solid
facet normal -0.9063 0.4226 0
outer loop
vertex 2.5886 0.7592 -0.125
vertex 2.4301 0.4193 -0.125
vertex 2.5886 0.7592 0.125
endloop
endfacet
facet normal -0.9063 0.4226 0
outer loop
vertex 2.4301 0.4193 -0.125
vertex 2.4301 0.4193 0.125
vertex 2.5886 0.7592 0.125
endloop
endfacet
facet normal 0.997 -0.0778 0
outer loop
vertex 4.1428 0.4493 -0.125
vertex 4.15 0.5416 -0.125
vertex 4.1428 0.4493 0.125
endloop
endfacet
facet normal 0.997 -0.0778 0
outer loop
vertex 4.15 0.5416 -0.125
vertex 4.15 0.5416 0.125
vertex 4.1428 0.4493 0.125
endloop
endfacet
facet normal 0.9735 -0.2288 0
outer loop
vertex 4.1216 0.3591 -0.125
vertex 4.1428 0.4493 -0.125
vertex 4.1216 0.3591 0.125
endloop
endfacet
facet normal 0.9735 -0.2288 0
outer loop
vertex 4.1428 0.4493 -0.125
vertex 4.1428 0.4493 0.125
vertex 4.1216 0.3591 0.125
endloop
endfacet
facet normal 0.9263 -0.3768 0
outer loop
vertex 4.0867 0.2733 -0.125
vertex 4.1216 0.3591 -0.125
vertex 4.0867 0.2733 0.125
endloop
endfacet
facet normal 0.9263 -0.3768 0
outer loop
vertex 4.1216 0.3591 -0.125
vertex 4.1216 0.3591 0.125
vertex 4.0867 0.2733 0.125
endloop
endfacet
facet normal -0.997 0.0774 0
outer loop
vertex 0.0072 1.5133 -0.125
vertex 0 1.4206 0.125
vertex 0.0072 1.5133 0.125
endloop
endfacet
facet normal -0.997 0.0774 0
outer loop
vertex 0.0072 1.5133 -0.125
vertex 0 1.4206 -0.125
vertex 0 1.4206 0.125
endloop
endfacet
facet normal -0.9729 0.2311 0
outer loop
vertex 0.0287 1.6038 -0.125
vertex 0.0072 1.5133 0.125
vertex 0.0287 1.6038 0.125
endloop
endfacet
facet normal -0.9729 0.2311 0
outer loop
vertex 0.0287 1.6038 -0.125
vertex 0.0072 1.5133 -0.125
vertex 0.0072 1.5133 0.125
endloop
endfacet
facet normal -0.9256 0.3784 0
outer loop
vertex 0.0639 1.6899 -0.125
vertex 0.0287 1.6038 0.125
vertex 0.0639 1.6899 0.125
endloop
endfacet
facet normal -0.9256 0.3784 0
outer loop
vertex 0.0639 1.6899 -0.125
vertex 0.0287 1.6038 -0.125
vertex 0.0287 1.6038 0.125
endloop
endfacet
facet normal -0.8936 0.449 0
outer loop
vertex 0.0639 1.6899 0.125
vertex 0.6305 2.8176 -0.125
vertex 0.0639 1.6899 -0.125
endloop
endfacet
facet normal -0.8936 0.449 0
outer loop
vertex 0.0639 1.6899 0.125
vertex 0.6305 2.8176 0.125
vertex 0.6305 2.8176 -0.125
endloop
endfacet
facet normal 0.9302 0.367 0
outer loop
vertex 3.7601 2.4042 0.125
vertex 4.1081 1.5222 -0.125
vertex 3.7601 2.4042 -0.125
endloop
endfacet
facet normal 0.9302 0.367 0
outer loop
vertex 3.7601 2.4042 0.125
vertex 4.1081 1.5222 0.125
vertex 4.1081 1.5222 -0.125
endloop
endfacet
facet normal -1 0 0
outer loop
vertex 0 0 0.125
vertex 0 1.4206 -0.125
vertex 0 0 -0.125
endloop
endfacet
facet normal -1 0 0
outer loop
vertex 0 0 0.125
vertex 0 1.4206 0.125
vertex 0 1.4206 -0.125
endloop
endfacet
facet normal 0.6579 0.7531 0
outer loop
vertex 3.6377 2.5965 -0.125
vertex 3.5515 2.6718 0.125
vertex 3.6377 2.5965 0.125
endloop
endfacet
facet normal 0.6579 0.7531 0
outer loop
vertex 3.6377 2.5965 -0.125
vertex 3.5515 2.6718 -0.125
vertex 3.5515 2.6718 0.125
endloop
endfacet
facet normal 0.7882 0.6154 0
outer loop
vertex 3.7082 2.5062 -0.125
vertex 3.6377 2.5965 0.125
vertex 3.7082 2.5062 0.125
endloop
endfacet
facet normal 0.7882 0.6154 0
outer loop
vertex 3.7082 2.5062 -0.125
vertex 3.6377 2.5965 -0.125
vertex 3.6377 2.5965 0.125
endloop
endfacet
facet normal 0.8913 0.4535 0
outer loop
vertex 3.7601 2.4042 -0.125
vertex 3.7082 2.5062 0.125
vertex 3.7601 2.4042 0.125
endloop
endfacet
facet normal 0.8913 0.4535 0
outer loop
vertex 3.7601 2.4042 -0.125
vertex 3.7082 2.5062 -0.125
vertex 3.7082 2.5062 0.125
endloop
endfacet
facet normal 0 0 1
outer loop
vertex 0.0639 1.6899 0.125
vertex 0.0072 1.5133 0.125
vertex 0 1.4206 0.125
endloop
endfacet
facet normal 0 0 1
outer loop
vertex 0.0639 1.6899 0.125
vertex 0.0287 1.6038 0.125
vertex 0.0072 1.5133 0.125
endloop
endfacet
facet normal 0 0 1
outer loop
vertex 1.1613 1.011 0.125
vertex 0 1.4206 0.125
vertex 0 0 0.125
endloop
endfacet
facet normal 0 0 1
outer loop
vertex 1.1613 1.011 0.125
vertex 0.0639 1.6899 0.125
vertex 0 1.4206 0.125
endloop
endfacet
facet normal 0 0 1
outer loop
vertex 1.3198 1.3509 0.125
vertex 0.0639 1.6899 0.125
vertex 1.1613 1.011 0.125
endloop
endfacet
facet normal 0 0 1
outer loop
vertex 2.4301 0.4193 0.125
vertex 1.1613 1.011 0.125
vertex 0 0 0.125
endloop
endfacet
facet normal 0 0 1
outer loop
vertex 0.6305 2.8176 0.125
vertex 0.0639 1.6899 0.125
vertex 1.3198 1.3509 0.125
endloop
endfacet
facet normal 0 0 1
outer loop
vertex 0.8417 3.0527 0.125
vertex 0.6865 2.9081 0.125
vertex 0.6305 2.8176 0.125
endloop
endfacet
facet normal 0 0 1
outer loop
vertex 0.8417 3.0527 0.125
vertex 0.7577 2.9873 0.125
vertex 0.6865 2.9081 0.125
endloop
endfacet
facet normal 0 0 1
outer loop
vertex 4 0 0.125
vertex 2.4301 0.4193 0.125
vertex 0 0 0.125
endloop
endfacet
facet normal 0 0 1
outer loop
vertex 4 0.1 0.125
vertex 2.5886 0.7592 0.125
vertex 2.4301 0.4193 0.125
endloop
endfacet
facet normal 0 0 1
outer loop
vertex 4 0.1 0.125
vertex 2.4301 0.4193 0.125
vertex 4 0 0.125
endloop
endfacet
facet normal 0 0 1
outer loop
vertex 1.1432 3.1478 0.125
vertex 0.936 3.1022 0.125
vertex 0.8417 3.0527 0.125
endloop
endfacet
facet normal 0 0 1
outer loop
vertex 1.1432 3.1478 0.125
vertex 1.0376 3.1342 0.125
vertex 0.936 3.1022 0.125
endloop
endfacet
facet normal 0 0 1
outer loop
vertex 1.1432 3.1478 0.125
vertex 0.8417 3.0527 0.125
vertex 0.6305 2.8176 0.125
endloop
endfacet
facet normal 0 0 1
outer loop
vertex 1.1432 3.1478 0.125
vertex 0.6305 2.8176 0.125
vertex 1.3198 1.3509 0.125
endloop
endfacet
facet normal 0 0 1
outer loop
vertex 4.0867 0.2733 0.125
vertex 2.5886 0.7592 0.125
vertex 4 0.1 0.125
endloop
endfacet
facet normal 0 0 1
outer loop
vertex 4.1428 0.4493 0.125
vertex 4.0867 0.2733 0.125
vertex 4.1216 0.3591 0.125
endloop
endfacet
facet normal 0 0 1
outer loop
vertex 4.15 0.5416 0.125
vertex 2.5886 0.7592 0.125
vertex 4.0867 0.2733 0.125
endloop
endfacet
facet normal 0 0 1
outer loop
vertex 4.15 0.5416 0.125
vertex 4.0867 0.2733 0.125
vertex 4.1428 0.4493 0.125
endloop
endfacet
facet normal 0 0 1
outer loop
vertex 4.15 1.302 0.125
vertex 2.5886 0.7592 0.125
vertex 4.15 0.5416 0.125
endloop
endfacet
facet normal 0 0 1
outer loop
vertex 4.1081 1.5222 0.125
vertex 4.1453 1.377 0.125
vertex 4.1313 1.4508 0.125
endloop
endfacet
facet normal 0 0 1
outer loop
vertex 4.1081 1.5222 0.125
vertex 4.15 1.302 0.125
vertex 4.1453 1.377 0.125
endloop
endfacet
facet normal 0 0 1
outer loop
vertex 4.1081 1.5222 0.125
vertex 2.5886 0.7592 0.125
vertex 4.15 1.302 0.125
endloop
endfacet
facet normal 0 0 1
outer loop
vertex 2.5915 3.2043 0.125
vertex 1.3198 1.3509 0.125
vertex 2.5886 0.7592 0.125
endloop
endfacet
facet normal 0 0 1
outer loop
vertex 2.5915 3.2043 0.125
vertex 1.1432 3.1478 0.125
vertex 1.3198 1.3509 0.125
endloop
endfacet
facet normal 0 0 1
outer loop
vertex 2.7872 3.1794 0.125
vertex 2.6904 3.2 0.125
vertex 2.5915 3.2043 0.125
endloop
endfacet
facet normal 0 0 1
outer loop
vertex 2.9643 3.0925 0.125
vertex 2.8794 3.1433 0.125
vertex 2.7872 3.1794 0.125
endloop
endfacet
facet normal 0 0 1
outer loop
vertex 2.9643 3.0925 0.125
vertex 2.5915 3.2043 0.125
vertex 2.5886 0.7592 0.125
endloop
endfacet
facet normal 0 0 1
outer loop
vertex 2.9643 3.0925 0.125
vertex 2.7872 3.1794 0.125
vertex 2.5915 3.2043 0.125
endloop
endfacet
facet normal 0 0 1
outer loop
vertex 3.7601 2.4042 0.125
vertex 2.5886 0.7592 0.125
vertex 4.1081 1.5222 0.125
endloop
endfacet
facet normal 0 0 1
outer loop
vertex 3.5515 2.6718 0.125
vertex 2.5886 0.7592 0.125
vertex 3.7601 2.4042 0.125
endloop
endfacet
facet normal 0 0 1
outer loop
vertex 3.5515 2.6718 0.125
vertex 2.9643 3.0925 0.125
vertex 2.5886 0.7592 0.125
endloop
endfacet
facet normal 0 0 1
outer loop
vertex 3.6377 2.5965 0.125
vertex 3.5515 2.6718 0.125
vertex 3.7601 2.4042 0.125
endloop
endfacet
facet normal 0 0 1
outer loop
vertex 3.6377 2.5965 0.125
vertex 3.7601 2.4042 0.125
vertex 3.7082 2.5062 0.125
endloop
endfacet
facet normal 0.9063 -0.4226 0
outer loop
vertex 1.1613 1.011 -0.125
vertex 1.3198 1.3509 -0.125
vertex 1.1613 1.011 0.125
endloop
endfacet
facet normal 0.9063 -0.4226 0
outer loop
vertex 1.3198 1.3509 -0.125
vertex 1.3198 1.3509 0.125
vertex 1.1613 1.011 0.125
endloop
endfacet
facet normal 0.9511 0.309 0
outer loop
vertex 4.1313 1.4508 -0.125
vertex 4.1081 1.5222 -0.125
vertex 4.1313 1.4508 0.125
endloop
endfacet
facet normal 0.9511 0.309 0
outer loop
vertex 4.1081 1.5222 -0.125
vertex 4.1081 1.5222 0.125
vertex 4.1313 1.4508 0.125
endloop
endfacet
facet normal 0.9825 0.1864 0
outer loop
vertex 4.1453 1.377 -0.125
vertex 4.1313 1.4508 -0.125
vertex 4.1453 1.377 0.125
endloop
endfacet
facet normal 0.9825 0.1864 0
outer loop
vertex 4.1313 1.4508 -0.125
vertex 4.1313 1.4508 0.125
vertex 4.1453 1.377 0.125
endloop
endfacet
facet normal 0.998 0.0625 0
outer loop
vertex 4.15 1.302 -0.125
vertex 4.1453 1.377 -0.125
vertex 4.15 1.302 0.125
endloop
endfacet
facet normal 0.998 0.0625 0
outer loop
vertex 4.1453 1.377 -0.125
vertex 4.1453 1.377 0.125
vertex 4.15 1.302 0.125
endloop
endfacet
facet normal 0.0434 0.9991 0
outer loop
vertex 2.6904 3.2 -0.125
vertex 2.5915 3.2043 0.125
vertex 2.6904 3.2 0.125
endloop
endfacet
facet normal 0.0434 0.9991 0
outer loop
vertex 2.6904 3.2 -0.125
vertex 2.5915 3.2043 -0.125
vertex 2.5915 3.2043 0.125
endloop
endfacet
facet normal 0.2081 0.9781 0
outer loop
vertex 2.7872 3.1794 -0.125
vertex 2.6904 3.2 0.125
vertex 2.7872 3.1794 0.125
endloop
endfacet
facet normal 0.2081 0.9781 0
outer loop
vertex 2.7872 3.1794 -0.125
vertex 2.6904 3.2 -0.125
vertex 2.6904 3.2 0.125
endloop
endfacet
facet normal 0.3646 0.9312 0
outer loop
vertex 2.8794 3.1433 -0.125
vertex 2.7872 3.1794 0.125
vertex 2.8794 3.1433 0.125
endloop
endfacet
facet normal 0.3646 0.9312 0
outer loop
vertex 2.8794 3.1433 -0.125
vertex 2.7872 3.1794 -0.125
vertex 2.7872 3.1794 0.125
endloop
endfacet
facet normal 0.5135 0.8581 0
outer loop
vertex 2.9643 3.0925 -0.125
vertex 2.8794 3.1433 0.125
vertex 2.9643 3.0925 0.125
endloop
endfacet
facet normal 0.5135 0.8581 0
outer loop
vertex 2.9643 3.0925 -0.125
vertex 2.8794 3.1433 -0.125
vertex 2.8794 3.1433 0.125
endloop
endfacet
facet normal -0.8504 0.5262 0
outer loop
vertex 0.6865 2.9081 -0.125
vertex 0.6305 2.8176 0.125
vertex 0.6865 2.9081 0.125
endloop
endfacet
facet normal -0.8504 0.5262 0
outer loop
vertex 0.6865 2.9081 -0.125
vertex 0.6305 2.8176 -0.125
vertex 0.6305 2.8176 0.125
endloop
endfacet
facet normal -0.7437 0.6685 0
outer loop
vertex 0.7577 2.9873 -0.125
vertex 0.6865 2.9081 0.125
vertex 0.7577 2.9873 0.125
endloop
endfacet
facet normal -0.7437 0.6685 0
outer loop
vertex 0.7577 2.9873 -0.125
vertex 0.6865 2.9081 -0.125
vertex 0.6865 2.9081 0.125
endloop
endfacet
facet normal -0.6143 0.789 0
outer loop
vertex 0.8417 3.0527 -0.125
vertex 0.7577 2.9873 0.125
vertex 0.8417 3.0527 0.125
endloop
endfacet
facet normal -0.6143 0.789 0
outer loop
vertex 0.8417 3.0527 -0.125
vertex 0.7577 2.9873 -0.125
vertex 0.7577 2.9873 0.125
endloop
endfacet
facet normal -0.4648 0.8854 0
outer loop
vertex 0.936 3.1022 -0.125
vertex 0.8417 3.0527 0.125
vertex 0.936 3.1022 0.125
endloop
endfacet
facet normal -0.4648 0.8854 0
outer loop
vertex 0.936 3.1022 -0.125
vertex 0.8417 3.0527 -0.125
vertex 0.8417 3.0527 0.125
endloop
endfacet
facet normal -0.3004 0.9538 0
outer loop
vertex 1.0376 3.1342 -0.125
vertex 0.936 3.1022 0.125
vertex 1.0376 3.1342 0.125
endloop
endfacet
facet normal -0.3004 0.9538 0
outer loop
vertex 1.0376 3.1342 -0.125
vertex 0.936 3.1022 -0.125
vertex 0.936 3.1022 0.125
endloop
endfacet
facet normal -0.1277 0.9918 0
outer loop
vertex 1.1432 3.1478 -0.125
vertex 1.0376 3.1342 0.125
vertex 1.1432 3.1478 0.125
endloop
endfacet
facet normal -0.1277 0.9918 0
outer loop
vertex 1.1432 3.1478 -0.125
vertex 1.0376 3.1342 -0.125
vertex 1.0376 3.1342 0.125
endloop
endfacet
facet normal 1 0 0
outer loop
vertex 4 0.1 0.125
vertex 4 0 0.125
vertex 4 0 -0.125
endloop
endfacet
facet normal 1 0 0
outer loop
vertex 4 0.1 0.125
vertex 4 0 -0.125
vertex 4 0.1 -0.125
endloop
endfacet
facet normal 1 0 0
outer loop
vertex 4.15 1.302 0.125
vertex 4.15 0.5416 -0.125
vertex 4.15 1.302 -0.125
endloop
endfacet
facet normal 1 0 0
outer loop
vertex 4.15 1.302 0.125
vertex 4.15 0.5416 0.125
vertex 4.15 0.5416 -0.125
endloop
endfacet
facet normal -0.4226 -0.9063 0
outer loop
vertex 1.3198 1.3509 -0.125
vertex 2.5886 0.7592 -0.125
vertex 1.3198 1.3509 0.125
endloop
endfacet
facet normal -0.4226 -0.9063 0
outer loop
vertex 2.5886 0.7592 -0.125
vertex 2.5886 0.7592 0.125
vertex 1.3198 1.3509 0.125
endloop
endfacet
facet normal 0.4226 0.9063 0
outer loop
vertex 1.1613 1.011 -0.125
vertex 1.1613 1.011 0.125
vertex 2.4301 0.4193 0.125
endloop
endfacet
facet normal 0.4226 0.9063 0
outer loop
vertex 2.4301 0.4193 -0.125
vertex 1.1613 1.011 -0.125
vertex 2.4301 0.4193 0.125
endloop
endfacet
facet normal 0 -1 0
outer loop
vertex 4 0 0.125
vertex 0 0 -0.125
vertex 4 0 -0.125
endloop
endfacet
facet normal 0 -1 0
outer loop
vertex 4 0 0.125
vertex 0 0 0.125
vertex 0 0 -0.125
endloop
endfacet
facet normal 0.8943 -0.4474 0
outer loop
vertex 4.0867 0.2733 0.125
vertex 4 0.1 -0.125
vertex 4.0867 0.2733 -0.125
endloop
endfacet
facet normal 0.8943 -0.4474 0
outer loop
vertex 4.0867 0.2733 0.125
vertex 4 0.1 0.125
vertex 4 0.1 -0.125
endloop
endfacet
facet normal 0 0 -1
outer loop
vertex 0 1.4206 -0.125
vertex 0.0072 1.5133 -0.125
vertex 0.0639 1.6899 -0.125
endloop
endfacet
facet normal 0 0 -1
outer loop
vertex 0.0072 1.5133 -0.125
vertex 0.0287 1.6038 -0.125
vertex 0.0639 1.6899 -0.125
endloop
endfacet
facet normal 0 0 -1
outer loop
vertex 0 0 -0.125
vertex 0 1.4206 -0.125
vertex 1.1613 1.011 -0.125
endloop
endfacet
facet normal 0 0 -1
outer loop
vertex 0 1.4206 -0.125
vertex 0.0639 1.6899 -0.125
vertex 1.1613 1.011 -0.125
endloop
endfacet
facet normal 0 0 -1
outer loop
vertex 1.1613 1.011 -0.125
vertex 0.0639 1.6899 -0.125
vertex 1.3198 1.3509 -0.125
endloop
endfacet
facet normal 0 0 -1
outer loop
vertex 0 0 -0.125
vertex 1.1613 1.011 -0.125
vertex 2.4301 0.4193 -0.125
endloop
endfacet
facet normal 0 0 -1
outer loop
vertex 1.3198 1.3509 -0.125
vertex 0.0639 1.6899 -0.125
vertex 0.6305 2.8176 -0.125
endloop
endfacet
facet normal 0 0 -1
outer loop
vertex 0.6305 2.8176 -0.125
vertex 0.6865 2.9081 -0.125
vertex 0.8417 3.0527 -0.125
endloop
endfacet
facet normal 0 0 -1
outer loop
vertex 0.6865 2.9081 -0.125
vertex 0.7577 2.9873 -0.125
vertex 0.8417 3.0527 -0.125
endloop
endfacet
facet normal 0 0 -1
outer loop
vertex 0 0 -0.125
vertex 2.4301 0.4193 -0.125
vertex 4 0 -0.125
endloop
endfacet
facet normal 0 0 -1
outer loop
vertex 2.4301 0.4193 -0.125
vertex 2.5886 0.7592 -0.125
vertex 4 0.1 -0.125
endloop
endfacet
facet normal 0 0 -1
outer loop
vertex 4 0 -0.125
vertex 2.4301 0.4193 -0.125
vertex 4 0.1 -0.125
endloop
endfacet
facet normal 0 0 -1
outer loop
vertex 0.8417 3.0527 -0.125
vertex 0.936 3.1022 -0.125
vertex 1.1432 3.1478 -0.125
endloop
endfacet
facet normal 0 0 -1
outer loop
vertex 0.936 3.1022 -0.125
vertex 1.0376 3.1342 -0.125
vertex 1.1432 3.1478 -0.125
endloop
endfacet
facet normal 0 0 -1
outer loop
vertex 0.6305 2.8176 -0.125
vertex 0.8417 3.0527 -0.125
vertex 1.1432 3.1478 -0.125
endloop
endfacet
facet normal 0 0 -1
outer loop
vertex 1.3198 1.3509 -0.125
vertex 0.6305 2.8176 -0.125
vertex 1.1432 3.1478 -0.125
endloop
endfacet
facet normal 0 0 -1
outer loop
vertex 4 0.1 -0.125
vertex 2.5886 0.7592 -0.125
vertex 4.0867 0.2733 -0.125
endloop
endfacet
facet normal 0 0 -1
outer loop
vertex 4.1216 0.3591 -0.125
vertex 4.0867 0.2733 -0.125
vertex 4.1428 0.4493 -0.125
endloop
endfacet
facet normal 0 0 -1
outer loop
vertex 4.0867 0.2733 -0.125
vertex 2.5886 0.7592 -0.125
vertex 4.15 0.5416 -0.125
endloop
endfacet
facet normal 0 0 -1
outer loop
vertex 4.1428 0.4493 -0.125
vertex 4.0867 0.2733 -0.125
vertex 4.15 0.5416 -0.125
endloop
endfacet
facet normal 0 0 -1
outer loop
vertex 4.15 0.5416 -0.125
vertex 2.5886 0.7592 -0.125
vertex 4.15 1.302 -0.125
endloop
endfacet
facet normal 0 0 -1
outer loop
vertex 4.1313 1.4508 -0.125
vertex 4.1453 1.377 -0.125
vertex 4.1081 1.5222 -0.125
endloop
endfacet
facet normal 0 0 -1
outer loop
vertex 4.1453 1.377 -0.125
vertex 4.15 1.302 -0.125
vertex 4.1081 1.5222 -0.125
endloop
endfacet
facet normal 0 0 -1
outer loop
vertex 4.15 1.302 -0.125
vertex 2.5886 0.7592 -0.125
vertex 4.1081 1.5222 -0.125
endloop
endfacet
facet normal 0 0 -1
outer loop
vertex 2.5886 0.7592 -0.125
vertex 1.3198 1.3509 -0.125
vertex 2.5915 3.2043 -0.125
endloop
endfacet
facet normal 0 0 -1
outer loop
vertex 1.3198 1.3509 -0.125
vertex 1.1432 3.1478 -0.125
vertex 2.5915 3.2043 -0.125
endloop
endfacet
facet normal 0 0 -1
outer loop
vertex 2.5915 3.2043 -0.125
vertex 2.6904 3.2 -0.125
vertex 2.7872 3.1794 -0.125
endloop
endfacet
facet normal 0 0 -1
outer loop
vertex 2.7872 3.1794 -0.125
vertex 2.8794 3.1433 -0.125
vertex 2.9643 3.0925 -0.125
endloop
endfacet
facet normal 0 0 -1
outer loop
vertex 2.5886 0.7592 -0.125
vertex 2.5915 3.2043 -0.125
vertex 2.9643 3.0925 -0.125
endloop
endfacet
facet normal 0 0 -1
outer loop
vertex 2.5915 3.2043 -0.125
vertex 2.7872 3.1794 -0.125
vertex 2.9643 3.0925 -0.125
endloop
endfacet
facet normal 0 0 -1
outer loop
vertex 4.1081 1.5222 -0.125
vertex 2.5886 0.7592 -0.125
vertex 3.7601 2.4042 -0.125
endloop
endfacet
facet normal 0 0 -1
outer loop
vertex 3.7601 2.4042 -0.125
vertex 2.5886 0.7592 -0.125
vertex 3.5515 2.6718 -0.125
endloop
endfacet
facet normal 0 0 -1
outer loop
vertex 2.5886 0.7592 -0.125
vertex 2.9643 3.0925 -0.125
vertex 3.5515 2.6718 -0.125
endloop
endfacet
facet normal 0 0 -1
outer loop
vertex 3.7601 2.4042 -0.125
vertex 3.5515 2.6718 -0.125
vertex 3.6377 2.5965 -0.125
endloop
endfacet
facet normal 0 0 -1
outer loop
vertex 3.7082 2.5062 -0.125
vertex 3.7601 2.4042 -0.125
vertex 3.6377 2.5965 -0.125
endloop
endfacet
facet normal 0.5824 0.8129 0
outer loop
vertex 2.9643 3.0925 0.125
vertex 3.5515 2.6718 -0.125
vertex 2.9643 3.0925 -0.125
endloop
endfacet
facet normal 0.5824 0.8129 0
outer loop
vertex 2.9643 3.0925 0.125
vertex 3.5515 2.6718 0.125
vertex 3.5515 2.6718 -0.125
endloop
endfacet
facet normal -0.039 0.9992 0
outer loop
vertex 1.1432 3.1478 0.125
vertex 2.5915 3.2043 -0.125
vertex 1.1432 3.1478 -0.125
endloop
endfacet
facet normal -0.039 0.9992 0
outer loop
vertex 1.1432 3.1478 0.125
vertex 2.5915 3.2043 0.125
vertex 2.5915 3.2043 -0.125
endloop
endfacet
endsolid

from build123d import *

# Parameters (mm, degrees)
BOSS_EXTRUDE1_DEPTH = 0.125
FILLET1_R           = 0.6


with BuildPart() as part:
    # frame_outline → Boss-Extrude1 (new, symmetric)
    with BuildSketch(Plane.XY):
        Polygon((0, 0), (4, 0), (4, 0.1), (4.15, 0.4), (4.15, 1.416096183), (3.695232724, 2.568743907), (2.797078859, 3.212298026), (0.789408464, 3.133982378), (0, 1.562826413), align=None)
        Polygon((1.161298437, 1.010989603), (2.430129339, 0.419324036), (2.588611187, 0.759189456), (1.319780285, 1.350855023), align=None, mode=Mode.SUBTRACT)
    extrude(amount=BOSS_EXTRUDE1_DEPTH, both=True)

    # Fillet1
    fillet1_edges = [part.edges().sort_by_distance(p)[0] for p in [
        (0, 1.562826413, 0),
        (0.789408464, 3.133982378, 0),
        (2.797078859, 3.212298026, 0),
        (3.695232724, 2.568743907, 0),
        (4.15, 1.416096183, 0),
        (4.15, 0.4, 0),
    ]]
    fillet(fillet1_edges, radius=FILLET1_R)


solid = part.part
